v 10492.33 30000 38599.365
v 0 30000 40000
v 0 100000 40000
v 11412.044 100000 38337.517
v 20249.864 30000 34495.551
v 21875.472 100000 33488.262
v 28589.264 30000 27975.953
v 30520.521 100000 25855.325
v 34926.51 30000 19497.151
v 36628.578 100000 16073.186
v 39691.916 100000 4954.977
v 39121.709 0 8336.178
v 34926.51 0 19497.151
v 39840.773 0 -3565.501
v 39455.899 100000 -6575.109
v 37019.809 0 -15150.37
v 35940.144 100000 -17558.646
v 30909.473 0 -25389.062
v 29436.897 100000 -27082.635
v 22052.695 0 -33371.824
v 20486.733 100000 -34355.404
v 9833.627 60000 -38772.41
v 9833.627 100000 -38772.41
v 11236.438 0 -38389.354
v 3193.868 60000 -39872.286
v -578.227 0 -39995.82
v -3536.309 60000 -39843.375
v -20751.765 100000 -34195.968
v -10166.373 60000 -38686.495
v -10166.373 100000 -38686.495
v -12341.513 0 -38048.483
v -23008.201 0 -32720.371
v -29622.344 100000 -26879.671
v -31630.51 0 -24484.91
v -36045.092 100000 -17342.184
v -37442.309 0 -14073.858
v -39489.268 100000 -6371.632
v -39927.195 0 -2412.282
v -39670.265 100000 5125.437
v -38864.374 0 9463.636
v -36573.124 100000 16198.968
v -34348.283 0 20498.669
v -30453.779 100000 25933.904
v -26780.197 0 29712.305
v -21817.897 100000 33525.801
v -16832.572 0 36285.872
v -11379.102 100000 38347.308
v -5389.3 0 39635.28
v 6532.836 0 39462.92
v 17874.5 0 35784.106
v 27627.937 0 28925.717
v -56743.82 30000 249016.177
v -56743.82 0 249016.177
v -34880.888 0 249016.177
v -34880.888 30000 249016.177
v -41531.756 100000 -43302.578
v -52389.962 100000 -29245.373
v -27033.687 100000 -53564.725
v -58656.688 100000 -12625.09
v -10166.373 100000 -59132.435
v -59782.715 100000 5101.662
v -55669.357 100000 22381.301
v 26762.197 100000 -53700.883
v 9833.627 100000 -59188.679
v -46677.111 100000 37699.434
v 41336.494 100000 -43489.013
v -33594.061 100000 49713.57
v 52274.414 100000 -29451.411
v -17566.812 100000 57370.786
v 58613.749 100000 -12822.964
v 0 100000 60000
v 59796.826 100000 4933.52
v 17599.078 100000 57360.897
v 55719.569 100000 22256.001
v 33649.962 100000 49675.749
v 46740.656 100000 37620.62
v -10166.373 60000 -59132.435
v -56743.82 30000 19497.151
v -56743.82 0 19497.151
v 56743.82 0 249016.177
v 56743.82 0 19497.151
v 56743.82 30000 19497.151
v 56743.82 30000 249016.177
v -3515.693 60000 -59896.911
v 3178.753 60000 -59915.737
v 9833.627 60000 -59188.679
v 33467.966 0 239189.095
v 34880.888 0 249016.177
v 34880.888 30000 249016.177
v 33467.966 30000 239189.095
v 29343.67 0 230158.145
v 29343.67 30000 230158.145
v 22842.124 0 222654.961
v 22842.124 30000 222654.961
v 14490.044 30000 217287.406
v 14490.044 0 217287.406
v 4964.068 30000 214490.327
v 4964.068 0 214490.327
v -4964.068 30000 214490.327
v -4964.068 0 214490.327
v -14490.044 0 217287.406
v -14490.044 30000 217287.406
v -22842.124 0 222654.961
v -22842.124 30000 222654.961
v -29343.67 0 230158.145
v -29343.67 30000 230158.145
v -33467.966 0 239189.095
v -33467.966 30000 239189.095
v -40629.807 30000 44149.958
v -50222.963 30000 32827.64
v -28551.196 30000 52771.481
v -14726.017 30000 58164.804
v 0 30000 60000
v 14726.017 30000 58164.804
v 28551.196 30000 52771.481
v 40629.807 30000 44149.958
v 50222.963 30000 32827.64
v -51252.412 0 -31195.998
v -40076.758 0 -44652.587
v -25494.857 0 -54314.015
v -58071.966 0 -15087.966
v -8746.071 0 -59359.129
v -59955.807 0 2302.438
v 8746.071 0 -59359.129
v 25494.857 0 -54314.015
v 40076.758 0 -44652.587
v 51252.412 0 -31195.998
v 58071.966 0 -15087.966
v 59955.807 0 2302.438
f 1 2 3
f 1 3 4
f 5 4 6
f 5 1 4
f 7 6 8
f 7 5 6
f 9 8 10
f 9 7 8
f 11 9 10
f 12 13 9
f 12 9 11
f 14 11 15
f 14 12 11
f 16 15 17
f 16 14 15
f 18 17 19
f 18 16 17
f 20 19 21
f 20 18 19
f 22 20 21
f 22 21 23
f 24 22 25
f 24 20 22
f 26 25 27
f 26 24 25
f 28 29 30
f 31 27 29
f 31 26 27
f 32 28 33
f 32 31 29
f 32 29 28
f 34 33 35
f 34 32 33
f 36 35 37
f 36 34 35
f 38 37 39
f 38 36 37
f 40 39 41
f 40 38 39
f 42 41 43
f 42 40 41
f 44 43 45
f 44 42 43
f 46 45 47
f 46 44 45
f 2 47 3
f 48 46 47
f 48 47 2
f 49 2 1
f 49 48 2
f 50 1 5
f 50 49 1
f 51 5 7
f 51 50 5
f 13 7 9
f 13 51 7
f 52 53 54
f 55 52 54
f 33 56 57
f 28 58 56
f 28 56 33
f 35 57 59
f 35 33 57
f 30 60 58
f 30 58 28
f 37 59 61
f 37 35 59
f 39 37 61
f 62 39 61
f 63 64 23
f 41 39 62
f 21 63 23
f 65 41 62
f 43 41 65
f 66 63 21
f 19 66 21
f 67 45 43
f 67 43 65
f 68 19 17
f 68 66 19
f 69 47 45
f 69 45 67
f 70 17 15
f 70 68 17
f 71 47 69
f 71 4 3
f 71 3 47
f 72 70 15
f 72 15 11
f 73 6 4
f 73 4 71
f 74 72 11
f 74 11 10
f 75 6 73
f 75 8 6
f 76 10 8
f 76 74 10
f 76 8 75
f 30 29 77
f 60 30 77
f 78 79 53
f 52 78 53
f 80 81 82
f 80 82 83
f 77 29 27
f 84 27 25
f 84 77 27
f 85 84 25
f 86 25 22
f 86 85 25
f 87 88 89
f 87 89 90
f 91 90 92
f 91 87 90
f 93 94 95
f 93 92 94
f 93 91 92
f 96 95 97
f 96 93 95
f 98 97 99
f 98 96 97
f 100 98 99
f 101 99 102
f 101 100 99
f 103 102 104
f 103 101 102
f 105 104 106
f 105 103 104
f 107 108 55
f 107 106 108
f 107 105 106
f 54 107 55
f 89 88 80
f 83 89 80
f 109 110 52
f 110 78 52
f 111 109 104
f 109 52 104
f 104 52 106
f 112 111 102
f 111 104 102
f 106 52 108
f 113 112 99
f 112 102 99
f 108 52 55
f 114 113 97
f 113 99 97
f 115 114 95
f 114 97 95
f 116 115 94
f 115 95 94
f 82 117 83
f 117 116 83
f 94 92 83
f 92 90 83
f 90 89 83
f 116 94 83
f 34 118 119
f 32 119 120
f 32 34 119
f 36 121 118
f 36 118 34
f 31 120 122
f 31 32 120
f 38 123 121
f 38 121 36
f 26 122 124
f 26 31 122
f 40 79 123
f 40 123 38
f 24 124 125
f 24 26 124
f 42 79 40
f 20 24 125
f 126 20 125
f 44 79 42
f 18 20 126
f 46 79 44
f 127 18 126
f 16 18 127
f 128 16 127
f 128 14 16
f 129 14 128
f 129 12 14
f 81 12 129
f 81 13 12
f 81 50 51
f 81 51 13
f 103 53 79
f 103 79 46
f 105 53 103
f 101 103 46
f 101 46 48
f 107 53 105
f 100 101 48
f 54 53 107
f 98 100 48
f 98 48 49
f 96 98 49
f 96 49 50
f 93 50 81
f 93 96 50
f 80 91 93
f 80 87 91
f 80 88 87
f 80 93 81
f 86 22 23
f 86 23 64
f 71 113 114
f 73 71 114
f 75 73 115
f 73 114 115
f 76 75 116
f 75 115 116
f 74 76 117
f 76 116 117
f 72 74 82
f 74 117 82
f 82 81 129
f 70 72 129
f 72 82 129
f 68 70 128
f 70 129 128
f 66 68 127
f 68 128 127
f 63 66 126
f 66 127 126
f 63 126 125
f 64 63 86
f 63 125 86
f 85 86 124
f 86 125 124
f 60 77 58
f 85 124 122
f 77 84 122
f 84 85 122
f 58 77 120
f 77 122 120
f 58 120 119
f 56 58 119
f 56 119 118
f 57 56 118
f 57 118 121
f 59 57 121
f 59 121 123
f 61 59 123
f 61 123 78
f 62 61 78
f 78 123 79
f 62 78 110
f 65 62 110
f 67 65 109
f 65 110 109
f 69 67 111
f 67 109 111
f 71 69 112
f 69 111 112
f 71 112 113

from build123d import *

# Parameters (mm, degrees)
SKETCH2_R               = 60000
SKETCH2_R_2             = 40000
BOSS_EXTRUDE1_DEPTH     = 100000
CUT_EXTRUDE1_DEPTH      = 14630
CUT_EXTRUDE1_DEPTH_BACK = 40000
SKETCH3_W               = 20000
SKETCH3_H               = 53751.270372234
SKETCH6_W               = 113487.639637956
SKETCH6_H               = 229519.025629528
BOSS_EXTRUDE3_DEPTH     = 30000
CUT_EXTRUDE2_DEPTH      = 28505
CUT_EXTRUDE2_DEPTH_BACK = 58994
SKETCH7_R               = 34880.887530656
CUT_EXTRUDE4_DEPTH      = 51190
CUT_EXTRUDE4_DEPTH_BACK = 76239
SKETCH8_R               = 40000


with BuildPart() as part:
    # Sketch2 → Boss-Extrude1 (new body)
    with BuildSketch(Plane(origin=(0, 0, 0), x_dir=(1, 0, 0), z_dir=(0, 1, 0))):
        with Locations(Location((0, 0, 0), (0, 0, 270))):
            Circle(SKETCH2_R)
        with Locations(Location((0, 0, 0), (0, 0, 270))):
            Circle(SKETCH2_R_2, mode=Mode.SUBTRACT)
    extrude(amount=BOSS_EXTRUDE1_DEPTH)

    # Sketch3 → Cut-Extrude1 (cut, two sides: drawn at the far end of the back side and taken through both)
    with BuildSketch(Plane(origin=(0, 100000, 0), x_dir=(1, 0, 0), z_dir=(0, 1, 0)).offset(-CUT_EXTRUDE1_DEPTH_BACK)):
        with Locations((-166.372945862, 35059.052743673)):
            Rectangle(SKETCH3_W, SKETCH3_H)
    extrude(amount=CUT_EXTRUDE1_DEPTH + CUT_EXTRUDE1_DEPTH_BACK, mode=Mode.SUBTRACT)

    # Sketch6 → Boss-Extrude3 (add)
    with BuildSketch(Plane.XZ):
        with Locations((0, 134256.664205451)):
            Rectangle(SKETCH6_W, SKETCH6_H)
    extrude(amount=-BOSS_EXTRUDE3_DEPTH)

    # Sketch7 → Cut-Extrude2 (cut, two sides: drawn at the far end of the back side and taken through both)
    with BuildSketch(Plane(origin=(0, 30000, 0), x_dir=(1, 0, 0), z_dir=(0, 1, 0)).offset(-CUT_EXTRUDE2_DEPTH_BACK)):
        with Locations((0, -249016.177020215)):
            Circle(SKETCH7_R)
    extrude(amount=CUT_EXTRUDE2_DEPTH + CUT_EXTRUDE2_DEPTH_BACK, mode=Mode.SUBTRACT)

    # Sketch8 → Cut-Extrude4 (cut, two sides: drawn at the far end of the back side and taken through both)
    with BuildSketch(Plane(origin=(0, 30000, 0), x_dir=(1, 0, 0), z_dir=(0, 1, 0)).offset(-CUT_EXTRUDE4_DEPTH_BACK)):
        with Locations(Location((0, 0, 0), (0, 0, 75.76847948))):
            Circle(SKETCH8_R)
    extrude(amount=CUT_EXTRUDE4_DEPTH + CUT_EXTRUDE4_DEPTH_BACK, mode=Mode.SUBTRACT)


solid = part.part
